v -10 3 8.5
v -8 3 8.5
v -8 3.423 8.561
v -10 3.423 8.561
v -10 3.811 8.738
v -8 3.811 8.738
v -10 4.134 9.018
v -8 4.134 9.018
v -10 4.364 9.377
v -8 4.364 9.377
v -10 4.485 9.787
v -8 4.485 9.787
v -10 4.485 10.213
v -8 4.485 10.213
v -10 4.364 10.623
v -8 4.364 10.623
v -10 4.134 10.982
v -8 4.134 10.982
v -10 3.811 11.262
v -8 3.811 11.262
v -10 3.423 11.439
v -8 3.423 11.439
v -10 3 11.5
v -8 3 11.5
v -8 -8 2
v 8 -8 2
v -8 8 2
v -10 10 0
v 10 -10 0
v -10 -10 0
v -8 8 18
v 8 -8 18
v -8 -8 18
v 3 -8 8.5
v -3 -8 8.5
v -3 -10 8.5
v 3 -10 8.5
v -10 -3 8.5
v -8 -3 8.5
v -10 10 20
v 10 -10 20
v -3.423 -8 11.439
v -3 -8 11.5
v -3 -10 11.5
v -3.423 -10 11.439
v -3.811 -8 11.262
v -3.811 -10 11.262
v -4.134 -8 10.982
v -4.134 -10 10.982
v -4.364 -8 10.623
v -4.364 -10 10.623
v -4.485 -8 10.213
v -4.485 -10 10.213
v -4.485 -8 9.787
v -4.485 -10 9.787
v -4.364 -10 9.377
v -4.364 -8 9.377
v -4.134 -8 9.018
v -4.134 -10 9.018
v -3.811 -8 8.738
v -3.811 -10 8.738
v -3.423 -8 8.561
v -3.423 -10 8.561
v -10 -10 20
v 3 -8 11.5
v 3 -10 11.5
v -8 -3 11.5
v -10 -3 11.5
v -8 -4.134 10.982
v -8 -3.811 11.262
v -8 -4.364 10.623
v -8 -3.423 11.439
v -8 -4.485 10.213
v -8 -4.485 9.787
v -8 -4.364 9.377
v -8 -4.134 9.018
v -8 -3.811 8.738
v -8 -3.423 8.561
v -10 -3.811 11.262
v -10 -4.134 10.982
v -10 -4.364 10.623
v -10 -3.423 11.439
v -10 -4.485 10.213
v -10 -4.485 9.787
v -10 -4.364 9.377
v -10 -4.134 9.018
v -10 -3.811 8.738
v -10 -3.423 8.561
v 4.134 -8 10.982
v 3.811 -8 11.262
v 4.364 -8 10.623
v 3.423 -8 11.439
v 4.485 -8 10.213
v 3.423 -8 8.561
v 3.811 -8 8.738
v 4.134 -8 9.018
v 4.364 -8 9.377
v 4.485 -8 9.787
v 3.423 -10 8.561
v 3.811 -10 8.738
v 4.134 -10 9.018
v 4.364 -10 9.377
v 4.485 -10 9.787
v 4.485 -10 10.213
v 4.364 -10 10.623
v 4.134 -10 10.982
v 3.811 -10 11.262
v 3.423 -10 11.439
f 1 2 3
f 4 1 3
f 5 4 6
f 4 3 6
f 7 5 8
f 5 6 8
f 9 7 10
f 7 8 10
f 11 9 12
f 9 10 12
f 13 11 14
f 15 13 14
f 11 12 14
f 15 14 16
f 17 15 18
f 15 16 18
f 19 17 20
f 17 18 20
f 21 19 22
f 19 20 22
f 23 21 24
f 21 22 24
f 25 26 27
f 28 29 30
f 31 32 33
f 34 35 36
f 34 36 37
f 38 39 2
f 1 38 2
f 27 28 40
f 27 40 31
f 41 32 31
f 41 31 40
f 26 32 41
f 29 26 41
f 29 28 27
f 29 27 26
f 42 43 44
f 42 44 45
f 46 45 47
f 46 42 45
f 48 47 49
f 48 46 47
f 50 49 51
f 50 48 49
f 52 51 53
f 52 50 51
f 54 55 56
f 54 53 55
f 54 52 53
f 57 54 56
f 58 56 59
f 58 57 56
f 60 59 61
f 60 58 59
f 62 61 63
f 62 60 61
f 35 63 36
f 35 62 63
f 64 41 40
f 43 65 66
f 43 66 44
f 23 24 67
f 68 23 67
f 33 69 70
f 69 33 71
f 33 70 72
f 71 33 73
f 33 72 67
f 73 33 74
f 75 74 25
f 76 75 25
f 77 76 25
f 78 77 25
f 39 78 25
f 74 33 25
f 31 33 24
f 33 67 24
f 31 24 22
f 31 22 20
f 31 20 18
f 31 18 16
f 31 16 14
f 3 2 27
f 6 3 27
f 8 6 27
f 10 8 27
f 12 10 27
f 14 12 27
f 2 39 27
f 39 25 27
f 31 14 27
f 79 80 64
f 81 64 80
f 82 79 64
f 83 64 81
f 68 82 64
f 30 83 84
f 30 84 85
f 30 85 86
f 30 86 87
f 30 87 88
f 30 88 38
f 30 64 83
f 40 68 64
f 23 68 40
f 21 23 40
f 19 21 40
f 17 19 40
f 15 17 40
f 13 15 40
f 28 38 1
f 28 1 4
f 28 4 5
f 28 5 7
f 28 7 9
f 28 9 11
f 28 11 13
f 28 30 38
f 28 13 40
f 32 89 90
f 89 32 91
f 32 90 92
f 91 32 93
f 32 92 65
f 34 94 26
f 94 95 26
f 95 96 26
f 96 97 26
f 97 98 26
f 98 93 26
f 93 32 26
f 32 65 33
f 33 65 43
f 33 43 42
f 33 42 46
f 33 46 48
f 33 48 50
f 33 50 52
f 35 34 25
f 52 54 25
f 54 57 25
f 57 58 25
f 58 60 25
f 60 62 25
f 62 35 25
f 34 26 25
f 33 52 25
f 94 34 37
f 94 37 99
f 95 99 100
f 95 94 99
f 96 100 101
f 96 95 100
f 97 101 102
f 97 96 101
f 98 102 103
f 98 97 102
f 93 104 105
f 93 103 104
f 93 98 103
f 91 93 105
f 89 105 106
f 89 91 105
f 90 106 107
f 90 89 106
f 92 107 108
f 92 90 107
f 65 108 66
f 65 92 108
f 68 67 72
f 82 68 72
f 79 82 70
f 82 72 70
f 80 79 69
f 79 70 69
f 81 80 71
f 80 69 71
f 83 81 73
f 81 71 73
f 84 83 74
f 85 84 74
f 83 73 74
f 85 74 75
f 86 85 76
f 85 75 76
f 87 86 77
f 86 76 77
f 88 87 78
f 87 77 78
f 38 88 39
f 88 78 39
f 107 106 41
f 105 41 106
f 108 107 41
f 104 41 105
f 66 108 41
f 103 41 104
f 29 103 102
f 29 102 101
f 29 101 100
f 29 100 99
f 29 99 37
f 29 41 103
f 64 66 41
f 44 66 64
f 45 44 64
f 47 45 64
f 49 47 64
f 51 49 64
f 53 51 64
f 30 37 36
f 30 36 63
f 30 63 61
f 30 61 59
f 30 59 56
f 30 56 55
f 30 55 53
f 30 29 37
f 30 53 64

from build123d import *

# Parameters (mm, degrees)
BOSS_EXTRUDE1_DEPTH = 20
SHELL1_T            = -2
CUT_EXTRUDE1_DEPTH  = 20
CUT_EXTRUDE2_DEPTH  = 20


with BuildPart() as part:
    # Sketch1 → Boss-Extrude1 (new body)
    with BuildSketch(Plane.XY):
        Polygon((-10, 10), (10, -10), (-10, -10), align=None)
    extrude(amount=BOSS_EXTRUDE1_DEPTH)

    # Shell1
    shell1_openings = [part.faces().sort_by_distance(p)[0] for p in [
        (0, 0, 10),
    ]]
    offset(amount=SHELL1_T, openings=shell1_openings, kind=Kind.INTERSECTION)

    # Sketch2 → Cut-Extrude1 (cut)
    with BuildSketch(Plane(origin=(-8, 0, 0), x_dir=(0, 0, -1), z_dir=(1, 0, 0))):
        with BuildLine():
            Line((-11.5, 3), (-11.5, -3))
            ThreePointArc((-11.5, -3), (-10, -4.5), (-8.5, -3))
            Line((-8.5, -3), (-8.5, 3))
            ThreePointArc((-8.5, 3), (-10, 4.5), (-11.5, 3))
        make_face()
    extrude(amount=-CUT_EXTRUDE1_DEPTH, mode=Mode.SUBTRACT)

    # Sketch3 → Cut-Extrude2 (cut)
    with BuildSketch(Plane(origin=(0, -8, 0), x_dir=(1, 0, 0), z_dir=(0, 1, 0))):
        with BuildLine():
            Line((-3, -8.5), (3, -8.5))
            ThreePointArc((3, -8.5), (4.5, -10), (3, -11.5))
            Line((3, -11.5), (-3, -11.5))
            ThreePointArc((-3, -11.5), (-4.5, -10), (-3, -8.5))
        make_face()
    extrude(amount=-CUT_EXTRUDE2_DEPTH, mode=Mode.SUBTRACT)


solid = part.part
